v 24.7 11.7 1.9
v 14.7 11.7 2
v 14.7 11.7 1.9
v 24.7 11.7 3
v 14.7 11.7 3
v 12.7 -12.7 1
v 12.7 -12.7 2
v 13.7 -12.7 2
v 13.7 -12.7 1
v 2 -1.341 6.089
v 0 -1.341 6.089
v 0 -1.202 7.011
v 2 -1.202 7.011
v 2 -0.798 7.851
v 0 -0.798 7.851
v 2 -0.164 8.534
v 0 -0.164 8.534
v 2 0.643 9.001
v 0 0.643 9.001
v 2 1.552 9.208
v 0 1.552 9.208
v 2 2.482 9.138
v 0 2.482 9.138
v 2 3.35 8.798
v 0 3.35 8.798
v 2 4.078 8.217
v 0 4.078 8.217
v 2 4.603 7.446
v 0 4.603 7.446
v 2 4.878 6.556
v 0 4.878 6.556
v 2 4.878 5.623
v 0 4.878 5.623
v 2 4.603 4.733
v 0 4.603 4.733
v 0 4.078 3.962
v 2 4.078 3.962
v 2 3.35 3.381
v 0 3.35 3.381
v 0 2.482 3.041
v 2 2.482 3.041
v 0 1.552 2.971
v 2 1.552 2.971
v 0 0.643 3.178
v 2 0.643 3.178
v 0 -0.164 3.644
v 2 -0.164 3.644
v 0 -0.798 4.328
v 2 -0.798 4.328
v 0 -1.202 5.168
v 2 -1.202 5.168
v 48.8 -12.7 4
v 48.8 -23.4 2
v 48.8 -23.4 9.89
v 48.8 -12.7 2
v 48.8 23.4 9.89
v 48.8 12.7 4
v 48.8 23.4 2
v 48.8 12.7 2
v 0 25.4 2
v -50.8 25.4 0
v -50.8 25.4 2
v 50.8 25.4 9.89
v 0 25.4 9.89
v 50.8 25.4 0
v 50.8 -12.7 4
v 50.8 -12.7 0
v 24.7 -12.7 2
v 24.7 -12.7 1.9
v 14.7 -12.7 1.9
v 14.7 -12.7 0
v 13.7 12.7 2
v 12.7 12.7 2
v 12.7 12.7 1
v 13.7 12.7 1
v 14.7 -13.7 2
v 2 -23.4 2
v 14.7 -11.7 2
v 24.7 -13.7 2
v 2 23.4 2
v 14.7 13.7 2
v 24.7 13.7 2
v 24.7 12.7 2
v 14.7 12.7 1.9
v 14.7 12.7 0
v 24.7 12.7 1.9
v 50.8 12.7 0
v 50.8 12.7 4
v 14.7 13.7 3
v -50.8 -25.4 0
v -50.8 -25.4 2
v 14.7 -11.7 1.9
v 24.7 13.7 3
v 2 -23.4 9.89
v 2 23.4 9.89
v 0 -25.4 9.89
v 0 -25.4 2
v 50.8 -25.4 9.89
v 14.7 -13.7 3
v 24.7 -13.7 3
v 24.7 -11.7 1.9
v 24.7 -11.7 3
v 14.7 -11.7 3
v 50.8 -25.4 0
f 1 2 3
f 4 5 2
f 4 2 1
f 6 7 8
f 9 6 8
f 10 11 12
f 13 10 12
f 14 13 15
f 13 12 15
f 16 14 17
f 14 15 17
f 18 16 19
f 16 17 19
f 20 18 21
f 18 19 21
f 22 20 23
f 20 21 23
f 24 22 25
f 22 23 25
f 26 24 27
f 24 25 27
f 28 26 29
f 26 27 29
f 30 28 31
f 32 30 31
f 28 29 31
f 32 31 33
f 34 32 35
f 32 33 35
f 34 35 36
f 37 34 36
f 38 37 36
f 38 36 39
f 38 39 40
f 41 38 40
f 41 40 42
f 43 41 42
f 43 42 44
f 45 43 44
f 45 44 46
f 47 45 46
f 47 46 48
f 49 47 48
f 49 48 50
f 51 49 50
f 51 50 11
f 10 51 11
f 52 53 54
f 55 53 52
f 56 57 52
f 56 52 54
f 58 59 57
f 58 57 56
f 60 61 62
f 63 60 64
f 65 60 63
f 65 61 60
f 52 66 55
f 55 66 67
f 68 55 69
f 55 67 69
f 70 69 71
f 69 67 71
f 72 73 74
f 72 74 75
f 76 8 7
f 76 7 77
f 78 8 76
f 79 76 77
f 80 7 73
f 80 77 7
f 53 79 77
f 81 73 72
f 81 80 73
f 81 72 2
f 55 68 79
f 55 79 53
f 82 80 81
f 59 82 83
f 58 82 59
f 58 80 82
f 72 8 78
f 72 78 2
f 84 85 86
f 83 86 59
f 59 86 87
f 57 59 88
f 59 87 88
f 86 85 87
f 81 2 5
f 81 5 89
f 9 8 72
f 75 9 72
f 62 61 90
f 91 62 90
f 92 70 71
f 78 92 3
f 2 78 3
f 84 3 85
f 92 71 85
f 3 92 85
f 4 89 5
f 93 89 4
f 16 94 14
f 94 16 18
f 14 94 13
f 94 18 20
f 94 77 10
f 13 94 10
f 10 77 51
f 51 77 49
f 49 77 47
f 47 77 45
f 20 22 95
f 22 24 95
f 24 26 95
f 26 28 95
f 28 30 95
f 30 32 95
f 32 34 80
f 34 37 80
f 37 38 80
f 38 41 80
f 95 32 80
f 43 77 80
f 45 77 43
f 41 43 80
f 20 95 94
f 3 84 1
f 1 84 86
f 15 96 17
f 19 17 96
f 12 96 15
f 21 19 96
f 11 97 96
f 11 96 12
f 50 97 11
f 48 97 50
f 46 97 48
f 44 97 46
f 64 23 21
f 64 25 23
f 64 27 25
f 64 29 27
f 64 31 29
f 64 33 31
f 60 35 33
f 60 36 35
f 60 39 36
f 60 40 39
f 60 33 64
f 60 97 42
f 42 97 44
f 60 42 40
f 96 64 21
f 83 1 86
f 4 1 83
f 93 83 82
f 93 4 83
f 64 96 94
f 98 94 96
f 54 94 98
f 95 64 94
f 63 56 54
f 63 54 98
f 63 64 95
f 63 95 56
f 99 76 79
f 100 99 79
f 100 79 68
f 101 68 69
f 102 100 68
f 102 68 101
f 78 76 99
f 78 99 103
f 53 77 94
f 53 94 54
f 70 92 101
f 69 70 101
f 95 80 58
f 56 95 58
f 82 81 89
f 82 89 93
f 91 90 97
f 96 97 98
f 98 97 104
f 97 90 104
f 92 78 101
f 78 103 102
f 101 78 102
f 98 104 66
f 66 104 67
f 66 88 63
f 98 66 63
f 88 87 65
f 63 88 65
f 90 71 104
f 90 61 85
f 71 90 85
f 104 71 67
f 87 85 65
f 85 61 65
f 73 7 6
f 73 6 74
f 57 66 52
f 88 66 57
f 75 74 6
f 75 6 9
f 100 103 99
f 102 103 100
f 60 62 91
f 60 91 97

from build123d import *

# Parameters (mm, degrees)
F1_DEPTH       = 2
F2_W           = 50.8
F2_H           = 50.8
F2_W_2         = 46.8
F2_H_2         = 46.8
F3_DEPTH       = 8.89
F4_R           = 3.127246
F5_DEPTH       = 25.4
F6_W           = 25.4
F6_H           = 2
F7_DEPTH       = 25.4
F8_W           = 50.8
F8_H           = 50.8
F9_DEPTH       = 1
F10_W          = 1
F10_H          = 25.4
F11_DEPTH      = 1
F12_W          = 10
F12_H          = 2
F13_DEPTH      = 1
F13_DEPTH_BACK = 0.1


with BuildPart() as f1:
    # F0 (on Top) → F1 (new body)
    with BuildSketch(Plane.XY):
        Polygon((50.8, 25.4), (-50.8, 25.4), (-50.8, -25.4), (50.8, -25.4), (50.8, -12.7), (14.7, -12.7), (14.7, 12.7), (50.8, 12.7), align=None)
    extrude(amount=F1_DEPTH)

    # F2 (on face) → F3 (join)
    with BuildSketch(Plane.XY.offset(2)):
        with Locations((25.4, 0)):
            Rectangle(F2_W, F2_H)
        with Locations((25.4, 0)):
            Rectangle(F2_W_2, F2_H_2, mode=Mode.SUBTRACT)
    extrude(amount=F3_DEPTH)

    # F4 (on face) → F5 (cut)
    with BuildSketch(Plane(origin=(0, 0, 0), x_dir=(0, -1, 0), z_dir=(-1, 0, 0))):
        with Locations((-1.785935, 6.089438)):
            Circle(F4_R)
    extrude(amount=-F5_DEPTH, mode=Mode.SUBTRACT)

    # F6 (on face) → F7 (cut)
    with BuildSketch(Plane.YZ.offset(50.8)):
        with Locations((0, 3)):
            Rectangle(F6_W, F6_H)
    extrude(amount=-F7_DEPTH, mode=Mode.SUBTRACT)

    # F8 (on face) → F9 (cut)
    with BuildSketch(Plane.XY.offset(10.89)):
        with Locations((25.4, 0)):
            Rectangle(F8_W, F8_H)
    extrude(amount=-F9_DEPTH, mode=Mode.SUBTRACT)

    # F10 (on face) → F11 (cut)
    with BuildSketch(Plane.XY.offset(2)):
        with Locations((13.2, 0)):
            Rectangle(F10_W, F10_H)
    extrude(amount=-F11_DEPTH, mode=Mode.SUBTRACT)

    # F12 (on face) → F13 (join, two sides)
    with BuildSketch(Plane.XY.offset(2)) as f13_sk:
        with Locations((19.7, -12.7)):
            Rectangle(F12_W, F12_H)
        with Locations((19.7, 12.7)):
            Rectangle(F12_W, F12_H)
    extrude(amount=F13_DEPTH)
    extrude(f13_sk.sketch, amount=-F13_DEPTH_BACK)


solid = f1.part
